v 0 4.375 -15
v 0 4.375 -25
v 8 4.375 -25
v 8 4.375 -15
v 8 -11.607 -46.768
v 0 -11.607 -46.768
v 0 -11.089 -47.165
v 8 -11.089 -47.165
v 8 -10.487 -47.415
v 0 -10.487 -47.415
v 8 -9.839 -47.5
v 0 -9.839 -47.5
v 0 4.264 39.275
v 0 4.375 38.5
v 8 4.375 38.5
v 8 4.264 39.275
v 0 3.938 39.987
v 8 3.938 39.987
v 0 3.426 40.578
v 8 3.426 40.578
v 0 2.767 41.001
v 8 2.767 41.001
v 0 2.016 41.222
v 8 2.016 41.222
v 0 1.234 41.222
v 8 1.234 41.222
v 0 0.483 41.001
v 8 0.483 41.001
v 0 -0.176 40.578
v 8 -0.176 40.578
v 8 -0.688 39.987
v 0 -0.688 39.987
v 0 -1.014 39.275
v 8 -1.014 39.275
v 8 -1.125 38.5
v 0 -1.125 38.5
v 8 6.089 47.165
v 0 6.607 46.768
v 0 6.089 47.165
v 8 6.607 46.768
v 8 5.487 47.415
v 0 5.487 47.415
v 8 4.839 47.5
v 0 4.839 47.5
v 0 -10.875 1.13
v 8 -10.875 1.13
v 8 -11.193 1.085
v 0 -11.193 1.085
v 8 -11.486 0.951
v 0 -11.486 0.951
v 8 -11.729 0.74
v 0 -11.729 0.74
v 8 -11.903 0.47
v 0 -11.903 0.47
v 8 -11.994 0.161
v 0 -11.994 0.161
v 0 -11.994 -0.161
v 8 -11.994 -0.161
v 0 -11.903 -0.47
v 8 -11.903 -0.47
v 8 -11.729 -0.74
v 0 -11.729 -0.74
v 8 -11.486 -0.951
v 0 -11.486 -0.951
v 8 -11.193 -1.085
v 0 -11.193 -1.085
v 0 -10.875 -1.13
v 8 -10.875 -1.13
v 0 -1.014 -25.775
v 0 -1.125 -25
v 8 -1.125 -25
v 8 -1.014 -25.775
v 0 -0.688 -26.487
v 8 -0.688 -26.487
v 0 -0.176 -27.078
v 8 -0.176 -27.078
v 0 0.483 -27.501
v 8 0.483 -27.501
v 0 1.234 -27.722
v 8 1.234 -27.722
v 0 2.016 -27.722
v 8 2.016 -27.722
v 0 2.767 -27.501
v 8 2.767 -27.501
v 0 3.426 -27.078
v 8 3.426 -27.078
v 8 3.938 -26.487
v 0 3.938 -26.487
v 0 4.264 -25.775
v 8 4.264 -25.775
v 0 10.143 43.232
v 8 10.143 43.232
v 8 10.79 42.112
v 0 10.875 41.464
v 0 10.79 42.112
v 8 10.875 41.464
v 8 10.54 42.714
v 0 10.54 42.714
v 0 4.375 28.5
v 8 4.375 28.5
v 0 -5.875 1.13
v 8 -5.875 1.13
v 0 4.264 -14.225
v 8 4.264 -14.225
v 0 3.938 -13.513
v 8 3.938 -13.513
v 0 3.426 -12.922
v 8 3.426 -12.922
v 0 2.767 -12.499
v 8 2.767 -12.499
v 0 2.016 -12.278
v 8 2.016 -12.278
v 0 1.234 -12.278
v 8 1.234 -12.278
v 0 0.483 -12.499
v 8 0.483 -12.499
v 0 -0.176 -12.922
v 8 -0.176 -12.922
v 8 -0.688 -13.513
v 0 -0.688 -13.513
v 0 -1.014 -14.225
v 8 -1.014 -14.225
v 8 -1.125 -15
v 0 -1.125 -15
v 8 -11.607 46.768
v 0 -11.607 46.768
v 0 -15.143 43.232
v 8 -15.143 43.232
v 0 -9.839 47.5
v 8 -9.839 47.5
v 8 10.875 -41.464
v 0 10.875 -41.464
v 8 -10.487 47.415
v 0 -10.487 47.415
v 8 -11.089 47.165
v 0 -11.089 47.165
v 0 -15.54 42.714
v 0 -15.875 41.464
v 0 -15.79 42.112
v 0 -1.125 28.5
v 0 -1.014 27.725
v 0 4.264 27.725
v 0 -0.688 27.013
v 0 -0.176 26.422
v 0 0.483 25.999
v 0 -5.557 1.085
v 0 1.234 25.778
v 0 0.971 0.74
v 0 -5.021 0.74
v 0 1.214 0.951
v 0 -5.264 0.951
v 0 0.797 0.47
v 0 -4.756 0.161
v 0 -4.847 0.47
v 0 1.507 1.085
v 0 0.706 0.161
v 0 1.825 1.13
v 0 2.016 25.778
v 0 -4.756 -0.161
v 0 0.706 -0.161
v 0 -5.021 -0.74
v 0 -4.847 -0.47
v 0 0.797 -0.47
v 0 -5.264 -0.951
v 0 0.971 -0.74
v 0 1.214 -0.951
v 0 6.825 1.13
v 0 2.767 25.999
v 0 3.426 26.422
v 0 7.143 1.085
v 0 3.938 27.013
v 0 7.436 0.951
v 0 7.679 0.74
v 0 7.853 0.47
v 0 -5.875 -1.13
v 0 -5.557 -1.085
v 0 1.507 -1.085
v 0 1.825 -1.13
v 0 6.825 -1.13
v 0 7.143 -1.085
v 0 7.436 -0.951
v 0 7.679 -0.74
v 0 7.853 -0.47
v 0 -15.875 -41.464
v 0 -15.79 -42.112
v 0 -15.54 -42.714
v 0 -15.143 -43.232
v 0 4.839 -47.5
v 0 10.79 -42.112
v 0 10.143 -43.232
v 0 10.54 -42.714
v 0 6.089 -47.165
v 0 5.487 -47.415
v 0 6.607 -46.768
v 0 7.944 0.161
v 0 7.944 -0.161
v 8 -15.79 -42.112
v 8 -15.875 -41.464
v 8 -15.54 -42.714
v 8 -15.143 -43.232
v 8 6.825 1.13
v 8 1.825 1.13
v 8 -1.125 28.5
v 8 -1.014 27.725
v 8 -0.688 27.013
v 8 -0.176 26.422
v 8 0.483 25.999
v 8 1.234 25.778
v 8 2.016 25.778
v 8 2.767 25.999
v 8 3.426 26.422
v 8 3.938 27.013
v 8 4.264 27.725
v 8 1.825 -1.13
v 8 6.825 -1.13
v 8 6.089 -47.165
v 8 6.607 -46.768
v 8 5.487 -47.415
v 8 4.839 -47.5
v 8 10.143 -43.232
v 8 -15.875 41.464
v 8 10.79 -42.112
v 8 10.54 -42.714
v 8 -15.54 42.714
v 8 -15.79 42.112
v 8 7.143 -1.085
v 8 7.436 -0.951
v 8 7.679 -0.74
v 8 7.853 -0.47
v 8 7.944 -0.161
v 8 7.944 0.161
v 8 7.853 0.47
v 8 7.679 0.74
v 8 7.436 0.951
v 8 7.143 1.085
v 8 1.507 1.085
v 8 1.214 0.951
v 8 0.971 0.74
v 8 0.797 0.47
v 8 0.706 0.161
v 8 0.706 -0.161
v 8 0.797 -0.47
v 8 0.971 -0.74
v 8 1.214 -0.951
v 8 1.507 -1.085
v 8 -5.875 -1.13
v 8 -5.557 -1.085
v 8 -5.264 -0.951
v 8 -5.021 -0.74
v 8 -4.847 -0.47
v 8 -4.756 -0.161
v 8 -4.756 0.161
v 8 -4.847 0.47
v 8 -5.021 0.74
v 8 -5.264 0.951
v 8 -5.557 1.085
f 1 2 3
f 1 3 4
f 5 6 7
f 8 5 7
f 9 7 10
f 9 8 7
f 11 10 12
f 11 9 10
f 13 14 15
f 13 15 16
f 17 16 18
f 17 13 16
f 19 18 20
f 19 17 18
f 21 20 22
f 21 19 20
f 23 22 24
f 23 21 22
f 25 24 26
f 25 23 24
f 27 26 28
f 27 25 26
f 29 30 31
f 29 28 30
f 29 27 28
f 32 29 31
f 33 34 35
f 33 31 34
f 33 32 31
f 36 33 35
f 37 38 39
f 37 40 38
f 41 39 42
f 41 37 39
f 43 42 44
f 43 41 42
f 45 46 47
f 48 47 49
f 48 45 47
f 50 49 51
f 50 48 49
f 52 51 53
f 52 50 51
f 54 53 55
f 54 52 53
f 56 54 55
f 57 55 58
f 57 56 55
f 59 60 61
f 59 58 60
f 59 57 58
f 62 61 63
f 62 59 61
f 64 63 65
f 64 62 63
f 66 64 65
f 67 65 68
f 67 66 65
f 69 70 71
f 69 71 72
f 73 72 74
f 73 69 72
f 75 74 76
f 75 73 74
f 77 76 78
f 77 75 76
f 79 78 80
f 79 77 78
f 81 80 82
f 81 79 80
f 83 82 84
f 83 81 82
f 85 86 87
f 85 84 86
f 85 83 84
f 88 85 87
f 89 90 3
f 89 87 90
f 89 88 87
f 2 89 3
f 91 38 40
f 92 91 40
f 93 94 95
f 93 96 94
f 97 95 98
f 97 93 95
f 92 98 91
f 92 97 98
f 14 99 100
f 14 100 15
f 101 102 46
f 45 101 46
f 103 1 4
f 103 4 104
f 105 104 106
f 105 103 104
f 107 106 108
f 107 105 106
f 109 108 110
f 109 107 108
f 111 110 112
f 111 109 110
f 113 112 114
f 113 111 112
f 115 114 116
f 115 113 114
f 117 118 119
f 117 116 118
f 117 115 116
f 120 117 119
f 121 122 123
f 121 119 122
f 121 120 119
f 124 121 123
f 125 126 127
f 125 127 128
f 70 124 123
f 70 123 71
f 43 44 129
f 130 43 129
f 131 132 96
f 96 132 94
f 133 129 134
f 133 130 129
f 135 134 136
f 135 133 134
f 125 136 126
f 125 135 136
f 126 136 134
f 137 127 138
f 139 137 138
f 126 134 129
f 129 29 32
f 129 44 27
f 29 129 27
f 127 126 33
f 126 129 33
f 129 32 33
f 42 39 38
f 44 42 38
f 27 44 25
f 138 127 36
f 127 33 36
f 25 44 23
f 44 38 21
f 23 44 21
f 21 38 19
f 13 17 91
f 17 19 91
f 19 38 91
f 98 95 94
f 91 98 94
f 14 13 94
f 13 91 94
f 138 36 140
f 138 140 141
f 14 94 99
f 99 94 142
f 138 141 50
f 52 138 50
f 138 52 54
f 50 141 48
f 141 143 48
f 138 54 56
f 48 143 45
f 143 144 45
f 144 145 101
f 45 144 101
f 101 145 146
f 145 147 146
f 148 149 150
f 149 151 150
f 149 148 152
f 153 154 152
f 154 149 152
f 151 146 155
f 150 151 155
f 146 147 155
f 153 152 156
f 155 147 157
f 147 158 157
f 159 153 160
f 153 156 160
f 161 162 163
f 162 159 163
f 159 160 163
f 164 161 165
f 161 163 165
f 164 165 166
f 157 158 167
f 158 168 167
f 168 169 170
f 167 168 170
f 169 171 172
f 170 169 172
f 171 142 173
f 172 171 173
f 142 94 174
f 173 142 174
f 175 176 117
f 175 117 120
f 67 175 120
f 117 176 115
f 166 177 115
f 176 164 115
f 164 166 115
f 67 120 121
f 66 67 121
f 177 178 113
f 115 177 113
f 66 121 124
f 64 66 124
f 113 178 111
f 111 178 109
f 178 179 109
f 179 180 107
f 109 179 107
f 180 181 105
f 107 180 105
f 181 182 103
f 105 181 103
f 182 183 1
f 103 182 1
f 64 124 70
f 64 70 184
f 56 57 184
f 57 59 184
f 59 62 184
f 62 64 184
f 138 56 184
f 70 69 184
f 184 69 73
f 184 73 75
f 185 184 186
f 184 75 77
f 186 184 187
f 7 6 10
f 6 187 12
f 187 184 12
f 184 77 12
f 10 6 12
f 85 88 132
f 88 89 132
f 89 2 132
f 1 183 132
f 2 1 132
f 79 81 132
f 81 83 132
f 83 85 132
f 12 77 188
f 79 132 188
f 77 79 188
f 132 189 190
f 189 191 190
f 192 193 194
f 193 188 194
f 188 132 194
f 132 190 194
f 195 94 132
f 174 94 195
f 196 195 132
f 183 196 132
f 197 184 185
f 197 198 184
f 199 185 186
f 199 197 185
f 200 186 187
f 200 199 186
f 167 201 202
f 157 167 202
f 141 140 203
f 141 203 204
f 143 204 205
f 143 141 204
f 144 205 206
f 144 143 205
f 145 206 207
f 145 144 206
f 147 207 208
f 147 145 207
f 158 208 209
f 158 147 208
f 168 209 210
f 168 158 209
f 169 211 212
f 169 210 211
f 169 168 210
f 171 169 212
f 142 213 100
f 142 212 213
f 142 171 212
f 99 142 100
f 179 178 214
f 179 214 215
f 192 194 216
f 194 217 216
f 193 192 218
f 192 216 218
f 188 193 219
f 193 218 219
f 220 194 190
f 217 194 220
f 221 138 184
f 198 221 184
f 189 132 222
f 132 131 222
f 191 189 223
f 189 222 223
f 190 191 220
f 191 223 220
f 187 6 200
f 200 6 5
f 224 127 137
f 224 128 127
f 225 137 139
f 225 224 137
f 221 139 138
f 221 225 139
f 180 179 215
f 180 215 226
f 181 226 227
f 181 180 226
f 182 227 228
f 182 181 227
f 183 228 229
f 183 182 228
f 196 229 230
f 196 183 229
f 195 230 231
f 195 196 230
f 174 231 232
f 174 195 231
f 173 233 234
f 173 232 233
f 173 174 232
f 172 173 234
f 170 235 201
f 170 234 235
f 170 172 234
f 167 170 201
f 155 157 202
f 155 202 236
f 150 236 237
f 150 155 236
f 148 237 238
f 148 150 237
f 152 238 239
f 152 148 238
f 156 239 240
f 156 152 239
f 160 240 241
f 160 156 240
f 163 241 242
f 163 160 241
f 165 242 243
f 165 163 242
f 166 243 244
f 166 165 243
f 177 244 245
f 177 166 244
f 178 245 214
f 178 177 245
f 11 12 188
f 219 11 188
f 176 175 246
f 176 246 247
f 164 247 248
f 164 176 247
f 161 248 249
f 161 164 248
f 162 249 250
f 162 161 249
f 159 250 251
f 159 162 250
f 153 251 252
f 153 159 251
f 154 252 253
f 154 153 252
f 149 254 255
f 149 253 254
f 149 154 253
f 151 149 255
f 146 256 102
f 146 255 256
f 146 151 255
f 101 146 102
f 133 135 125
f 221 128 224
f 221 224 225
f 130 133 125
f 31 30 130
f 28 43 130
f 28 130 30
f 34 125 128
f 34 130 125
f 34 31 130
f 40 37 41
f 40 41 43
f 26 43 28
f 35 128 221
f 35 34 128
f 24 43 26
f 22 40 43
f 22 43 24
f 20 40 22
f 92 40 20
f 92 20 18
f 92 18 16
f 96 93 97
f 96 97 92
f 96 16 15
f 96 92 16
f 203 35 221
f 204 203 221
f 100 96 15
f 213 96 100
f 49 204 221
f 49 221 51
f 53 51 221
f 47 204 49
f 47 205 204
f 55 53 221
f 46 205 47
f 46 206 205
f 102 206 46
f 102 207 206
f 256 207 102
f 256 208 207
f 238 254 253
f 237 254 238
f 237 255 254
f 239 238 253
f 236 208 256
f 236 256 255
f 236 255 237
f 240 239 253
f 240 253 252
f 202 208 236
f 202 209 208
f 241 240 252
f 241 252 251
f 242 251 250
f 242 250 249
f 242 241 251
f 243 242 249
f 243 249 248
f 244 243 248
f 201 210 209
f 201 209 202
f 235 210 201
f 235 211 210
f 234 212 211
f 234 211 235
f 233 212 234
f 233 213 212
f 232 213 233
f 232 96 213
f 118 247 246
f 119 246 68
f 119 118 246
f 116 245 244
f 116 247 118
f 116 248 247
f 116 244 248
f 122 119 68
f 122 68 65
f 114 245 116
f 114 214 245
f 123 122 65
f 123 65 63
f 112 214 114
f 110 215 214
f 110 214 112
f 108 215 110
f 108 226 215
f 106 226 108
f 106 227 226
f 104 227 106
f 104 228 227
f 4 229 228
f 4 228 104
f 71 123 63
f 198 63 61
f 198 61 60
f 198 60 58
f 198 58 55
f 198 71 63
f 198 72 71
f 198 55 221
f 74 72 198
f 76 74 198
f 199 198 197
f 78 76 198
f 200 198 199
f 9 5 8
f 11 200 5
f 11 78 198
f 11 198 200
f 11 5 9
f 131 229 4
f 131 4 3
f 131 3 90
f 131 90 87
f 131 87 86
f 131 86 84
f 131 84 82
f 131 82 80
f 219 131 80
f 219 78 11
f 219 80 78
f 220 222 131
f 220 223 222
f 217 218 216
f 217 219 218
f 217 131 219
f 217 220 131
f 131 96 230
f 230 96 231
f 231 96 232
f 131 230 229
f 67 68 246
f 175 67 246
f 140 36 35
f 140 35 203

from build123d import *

# Parameters (mm, degrees)
SKETCH1_W             = 80
SKETCH1_H             = 21.75
MAIN_DEPTH            = 8
M5_CLEARANCE_HOLE1_D  = 5.5
F_2_CLEARANCE_HOLE1_D = 2.2606
SPACER_DEPTH          = 8
CUT_EXTRUDE3_DEPTH    = 10
CHAMFER1_SIZE         = 5
FILLET1_R             = 2.5


with BuildPart() as part:
    # Sketch1 → Main (new body)
    with BuildSketch(Plane(origin=(0, 0, 0), x_dir=(0, 0, -1), z_dir=(1, 0, 0))):
        Rectangle(SKETCH1_W, SKETCH1_H)
    extrude(amount=MAIN_DEPTH)

    # M5 Clearance Hole1 (through all)
    with Locations(Plane.ZY):
        with Locations((-20, 1.625), (33.5, 1.625)):
            Hole(M5_CLEARANCE_HOLE1_D / 2)

    # #2 Clearance Hole1 (through all)
    with Locations(Plane.ZY):
        with Locations((0, -8.375), (0, 4.325)):
            Hole(F_2_CLEARANCE_HOLE1_D / 2)

    # Sketch13 → Spacer (add)
    with BuildSketch(Plane.ZY):
        Polygon((40, 10.875), (47.5, 10.875), (47.5, -15.875), (-47.5, -15.875), (-47.5, 10.875), (-40, 10.875), (-40, -10.875), (40, -10.875), align=None)
    extrude(amount=-SPACER_DEPTH)

    # Sketch14 → Cut-Extrude3 (cut)
    with BuildSketch(Plane.ZY):
        with BuildLine():
            Line((38.5, -1.125), (28.5, -1.125))
            ThreePointArc((28.5, -1.125), (25.75, 1.625), (28.5, 4.375))
            Line((28.5, 4.375), (38.5, 4.375))
            ThreePointArc((38.5, 4.375), (41.25, 1.625), (38.5, -1.125))
        make_face()
        with BuildLine():
            Line((-15, -1.125), (-25, -1.125))
            ThreePointArc((-25, -1.125), (-27.75, 1.625), (-25, 4.375))
            Line((-25, 4.375), (-15, 4.375))
            ThreePointArc((-15, 4.375), (-12.25, 1.625), (-15, -1.125))
        make_face()
        with BuildLine():
            Line((1.1303, -5.875), (1.1303, -10.875))
            ThreePointArc((1.1303, -10.875), (0, -12.0053), (-1.1303, -10.875))
            Line((-1.1303, -10.875), (-1.1303, -5.875))
            ThreePointArc((-1.1303, -5.875), (0, -4.7447), (1.1303, -5.875))
        make_face()
        with BuildLine():
            Line((1.1303, 6.825), (1.1303, 1.825))
            ThreePointArc((1.1303, 1.825), (0, 0.6947), (-1.1303, 1.825))
            Line((-1.1303, 1.825), (-1.1303, 6.825))
            ThreePointArc((-1.1303, 6.825), (0, 7.9553), (1.1303, 6.825))
        make_face()
    extrude(amount=-CUT_EXTRUDE3_DEPTH, mode=Mode.SUBTRACT)

    # Chamfer1
    chamfer1_edges = [part.edges().sort_by_distance(p)[0] for p in [
        (4, 10.875, -47.5),
        (4, 10.875, 47.5),
        (4, -15.875, 47.5),
        (4, -15.875, -47.5),
    ]]
    chamfer(chamfer1_edges, length=CHAMFER1_SIZE)

    # Fillet1
    fillet1_edges = [part.edges().sort_by_distance(p)[0] for p in [
        (4, 10.875, 42.5),
        (4, 10.875, -42.5),
        (4, -10.875, -47.5),
        (4, 5.875, -47.5),
        (4, -15.875, 42.5),
        (4, -15.875, -42.5),
        (4, -10.875, 47.5),
        (4, 5.875, 47.5),
    ]]
    fillet(fillet1_edges, radius=FILLET1_R)


solid = part.part
